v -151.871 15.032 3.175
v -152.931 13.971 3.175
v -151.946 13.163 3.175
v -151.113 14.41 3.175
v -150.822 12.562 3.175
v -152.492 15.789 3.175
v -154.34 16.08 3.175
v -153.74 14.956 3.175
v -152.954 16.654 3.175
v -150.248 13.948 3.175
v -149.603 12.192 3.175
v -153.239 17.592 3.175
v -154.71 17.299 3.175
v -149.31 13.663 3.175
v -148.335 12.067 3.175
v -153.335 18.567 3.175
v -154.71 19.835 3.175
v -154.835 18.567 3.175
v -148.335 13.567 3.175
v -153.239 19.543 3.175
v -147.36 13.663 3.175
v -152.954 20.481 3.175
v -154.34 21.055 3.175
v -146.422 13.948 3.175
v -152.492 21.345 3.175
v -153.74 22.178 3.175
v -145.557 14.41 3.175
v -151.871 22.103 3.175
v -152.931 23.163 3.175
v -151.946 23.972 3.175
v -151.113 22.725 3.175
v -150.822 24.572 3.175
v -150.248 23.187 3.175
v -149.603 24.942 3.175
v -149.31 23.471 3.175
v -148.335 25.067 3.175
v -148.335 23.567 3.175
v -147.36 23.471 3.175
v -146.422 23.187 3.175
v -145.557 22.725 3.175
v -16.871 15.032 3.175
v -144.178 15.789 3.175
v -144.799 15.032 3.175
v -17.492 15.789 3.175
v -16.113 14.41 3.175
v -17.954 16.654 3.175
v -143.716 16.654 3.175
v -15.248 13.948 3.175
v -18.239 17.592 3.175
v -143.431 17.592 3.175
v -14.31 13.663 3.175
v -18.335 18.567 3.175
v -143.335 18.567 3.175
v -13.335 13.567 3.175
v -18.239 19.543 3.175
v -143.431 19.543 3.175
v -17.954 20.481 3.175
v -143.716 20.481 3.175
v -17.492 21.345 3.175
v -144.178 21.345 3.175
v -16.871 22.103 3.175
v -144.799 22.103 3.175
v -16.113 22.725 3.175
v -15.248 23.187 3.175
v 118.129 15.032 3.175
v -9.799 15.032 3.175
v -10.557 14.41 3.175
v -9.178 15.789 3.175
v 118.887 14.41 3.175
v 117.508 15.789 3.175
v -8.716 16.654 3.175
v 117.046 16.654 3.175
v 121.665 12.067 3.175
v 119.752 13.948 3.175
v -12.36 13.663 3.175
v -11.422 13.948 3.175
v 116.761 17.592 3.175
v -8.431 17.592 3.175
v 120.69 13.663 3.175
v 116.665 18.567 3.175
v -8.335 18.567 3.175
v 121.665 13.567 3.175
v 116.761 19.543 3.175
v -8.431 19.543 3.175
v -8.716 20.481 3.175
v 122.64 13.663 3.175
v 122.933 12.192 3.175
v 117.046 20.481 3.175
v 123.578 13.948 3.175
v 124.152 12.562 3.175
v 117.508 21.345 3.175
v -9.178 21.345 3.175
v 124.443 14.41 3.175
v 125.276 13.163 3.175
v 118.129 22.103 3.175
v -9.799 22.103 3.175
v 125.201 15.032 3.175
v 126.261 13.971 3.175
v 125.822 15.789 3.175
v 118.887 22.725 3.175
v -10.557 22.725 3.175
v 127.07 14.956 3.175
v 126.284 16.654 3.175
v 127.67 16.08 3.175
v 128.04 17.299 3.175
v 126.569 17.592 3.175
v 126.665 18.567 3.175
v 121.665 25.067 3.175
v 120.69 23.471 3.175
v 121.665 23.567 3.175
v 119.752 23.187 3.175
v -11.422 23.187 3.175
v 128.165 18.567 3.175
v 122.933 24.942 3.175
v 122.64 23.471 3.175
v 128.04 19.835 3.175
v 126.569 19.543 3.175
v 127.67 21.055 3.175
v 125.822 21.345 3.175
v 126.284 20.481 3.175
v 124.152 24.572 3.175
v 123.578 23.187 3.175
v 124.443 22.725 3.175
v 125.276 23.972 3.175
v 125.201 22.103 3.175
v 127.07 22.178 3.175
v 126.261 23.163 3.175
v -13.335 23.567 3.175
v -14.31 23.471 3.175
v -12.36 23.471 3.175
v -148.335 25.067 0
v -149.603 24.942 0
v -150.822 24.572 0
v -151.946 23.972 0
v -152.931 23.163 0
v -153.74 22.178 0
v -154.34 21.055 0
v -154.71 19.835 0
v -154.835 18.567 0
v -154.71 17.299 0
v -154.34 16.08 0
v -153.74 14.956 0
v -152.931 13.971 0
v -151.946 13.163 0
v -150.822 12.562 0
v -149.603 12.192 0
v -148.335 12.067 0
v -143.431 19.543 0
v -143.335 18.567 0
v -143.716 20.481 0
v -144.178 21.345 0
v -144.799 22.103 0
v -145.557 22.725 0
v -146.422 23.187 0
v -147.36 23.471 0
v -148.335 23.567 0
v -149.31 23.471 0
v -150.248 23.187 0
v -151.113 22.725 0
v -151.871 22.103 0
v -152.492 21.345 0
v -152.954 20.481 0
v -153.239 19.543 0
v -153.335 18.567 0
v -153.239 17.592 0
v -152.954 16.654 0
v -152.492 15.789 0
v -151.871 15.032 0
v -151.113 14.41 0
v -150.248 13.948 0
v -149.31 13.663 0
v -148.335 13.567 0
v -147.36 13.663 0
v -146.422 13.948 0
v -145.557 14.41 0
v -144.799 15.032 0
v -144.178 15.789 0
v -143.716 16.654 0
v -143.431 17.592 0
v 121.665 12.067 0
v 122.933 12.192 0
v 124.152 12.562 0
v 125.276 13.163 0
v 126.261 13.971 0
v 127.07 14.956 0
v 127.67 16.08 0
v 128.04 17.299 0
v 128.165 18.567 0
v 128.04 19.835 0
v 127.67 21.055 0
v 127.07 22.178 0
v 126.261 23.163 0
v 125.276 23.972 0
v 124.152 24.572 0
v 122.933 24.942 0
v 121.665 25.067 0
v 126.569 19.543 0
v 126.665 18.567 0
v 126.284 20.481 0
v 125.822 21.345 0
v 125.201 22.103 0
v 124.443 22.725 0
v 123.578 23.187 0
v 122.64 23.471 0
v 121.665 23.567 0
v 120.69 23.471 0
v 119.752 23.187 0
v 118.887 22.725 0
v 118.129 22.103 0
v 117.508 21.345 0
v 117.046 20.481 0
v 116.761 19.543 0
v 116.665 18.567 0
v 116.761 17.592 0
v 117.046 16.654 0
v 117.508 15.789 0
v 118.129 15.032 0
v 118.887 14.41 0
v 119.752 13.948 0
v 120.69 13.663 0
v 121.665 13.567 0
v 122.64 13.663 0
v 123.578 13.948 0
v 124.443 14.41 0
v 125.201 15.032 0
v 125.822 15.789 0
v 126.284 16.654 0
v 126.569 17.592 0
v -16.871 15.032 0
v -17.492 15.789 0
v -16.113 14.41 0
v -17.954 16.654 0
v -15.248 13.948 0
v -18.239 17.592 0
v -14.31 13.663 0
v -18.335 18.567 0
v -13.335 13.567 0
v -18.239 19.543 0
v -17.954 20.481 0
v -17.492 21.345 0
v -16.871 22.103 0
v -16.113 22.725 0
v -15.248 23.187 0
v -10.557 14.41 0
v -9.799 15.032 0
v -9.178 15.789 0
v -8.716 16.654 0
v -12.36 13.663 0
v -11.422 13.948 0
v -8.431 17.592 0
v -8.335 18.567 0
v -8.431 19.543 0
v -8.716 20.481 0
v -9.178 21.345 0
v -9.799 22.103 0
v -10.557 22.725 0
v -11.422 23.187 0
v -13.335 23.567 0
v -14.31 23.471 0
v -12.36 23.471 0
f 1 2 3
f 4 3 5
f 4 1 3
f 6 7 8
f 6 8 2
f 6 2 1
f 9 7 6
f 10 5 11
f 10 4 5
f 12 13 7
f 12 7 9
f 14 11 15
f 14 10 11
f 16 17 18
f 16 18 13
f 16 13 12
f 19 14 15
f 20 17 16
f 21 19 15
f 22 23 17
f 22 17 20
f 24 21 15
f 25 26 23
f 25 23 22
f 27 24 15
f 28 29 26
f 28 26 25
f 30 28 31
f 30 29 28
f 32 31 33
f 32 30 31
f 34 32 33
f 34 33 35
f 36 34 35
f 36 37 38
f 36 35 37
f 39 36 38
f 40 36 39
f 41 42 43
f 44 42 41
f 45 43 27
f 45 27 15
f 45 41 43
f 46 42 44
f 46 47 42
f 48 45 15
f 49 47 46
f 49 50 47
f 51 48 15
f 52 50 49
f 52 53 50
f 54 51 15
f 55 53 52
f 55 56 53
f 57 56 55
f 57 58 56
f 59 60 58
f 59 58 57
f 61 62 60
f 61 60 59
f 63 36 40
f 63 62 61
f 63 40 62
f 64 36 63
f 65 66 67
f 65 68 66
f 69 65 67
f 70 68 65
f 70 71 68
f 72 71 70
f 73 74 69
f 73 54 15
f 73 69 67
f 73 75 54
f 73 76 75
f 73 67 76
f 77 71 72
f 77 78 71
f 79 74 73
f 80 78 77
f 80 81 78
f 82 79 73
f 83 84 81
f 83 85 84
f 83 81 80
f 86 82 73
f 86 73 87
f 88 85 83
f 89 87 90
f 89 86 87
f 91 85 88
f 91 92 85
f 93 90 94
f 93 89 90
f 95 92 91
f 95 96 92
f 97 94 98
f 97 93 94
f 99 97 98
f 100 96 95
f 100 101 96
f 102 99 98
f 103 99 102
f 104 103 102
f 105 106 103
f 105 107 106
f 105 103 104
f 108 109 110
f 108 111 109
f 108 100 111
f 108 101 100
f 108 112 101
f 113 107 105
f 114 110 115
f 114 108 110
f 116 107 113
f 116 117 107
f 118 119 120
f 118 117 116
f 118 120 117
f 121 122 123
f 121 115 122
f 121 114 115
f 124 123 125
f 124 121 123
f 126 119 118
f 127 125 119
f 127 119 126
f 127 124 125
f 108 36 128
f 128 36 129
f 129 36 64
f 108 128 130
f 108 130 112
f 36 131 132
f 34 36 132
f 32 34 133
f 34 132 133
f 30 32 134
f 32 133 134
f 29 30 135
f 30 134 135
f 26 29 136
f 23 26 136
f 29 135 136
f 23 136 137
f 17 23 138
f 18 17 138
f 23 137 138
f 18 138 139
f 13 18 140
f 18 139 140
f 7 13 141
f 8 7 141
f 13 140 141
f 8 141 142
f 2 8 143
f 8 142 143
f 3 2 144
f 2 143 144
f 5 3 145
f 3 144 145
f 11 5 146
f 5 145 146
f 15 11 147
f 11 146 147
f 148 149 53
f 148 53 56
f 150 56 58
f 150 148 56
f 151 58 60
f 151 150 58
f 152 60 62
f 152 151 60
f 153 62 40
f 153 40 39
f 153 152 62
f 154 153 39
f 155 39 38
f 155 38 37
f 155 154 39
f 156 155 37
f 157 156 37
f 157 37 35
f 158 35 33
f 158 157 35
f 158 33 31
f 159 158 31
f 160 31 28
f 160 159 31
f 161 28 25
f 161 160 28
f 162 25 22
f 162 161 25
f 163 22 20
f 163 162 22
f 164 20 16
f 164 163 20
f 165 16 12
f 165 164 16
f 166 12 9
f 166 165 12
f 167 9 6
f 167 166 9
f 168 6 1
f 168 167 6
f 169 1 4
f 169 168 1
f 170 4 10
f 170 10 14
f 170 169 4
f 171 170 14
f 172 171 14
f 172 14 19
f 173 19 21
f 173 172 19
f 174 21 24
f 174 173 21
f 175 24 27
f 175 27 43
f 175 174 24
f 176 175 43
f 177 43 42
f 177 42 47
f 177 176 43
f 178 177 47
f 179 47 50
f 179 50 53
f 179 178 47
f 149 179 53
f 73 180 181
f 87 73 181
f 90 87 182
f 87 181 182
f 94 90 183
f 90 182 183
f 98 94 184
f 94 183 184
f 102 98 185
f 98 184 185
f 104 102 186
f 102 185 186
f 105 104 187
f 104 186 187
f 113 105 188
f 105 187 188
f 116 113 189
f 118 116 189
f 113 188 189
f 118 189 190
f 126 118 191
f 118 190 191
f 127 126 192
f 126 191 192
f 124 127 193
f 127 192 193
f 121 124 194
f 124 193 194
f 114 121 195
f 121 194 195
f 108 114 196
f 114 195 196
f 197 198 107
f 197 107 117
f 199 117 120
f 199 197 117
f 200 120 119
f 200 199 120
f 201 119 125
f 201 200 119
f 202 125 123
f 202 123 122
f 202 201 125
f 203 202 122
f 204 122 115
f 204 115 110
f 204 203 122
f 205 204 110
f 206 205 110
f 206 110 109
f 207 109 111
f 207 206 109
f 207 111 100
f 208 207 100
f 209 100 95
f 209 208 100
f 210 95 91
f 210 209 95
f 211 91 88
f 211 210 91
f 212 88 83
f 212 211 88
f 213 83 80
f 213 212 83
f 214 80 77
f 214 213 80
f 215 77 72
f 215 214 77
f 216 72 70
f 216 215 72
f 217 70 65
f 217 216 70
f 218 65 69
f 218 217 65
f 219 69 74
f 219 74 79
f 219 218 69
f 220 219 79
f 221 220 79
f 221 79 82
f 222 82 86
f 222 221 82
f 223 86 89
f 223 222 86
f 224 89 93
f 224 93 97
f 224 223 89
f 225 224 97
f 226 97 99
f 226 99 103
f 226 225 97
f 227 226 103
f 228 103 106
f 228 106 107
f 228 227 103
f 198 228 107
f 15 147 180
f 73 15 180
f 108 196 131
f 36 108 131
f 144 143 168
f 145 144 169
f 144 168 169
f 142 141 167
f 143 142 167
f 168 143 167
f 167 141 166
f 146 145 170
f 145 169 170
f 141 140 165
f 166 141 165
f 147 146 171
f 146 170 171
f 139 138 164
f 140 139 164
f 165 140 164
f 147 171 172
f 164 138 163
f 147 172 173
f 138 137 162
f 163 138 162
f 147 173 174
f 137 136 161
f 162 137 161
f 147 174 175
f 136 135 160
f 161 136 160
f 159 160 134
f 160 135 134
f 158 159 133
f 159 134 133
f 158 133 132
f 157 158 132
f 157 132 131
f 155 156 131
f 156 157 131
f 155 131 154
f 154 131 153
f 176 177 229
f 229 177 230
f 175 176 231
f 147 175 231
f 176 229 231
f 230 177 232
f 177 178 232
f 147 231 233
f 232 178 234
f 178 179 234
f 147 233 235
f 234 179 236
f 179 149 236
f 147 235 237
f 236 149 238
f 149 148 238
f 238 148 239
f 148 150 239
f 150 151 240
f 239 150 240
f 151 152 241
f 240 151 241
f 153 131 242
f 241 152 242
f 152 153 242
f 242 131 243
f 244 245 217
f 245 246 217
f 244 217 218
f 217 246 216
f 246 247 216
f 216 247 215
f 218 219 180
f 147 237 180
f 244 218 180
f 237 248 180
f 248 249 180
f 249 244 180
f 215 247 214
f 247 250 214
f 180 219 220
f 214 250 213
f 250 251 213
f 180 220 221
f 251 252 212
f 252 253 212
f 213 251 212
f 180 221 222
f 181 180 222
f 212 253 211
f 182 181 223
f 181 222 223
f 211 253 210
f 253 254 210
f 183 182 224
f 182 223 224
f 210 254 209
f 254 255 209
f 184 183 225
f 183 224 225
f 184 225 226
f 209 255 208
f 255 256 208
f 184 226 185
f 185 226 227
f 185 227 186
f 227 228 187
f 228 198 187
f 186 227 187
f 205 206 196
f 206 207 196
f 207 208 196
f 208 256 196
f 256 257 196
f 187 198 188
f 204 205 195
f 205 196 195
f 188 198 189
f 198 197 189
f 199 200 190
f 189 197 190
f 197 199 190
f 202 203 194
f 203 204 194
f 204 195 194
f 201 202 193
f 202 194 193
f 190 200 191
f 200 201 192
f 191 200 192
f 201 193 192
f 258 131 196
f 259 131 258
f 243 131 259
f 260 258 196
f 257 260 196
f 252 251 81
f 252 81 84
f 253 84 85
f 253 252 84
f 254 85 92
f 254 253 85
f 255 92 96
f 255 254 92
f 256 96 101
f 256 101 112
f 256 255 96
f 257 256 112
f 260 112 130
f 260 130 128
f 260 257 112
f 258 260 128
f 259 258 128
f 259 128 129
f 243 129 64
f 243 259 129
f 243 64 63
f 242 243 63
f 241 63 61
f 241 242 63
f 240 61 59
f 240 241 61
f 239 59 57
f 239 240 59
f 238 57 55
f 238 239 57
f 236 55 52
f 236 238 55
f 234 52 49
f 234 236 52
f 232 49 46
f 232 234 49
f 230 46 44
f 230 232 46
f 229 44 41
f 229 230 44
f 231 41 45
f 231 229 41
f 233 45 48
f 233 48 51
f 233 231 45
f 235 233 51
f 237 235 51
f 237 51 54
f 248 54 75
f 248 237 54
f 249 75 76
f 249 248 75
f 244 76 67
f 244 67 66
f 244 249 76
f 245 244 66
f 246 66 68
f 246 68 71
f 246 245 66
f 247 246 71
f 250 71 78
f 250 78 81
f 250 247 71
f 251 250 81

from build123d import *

# Parameters (mm, degrees)
F0_R     = 5
F1_DEPTH = 3.175


with BuildPart() as f1:
    # F0 (on Top) → F1 (new body)
    with BuildSketch(Plane.XY):
        with BuildLine():
            Line((-80.835, 25.067168), (-148.335, 25.067168))
            ThreePointArc((-148.335, 25.067168), (-154.835, 18.567168), (-148.335, 12.067168))
            Line((-148.335, 12.067168), (-80.835, 12.067168))
            Line((-80.835, 12.067168), (-13.335, 12.067168))
            Line((-13.335, 12.067168), (54.165, 12.067168))
            Line((54.165, 12.067168), (121.665, 12.067168))
            ThreePointArc((121.665, 12.067168), (128.165, 18.567168), (121.665, 25.067168))
            Line((121.665, 25.067168), (54.165, 25.067168))
            Line((54.165, 25.067168), (-13.335, 25.067168))
            Line((-13.335, 25.067168), (-80.835, 25.067168))
        make_face()
        with Locations((-148.335, 18.567168)):
            Circle(F0_R, mode=Mode.SUBTRACT)
        with Locations((-13.335, 18.567168)):
            Circle(F0_R, mode=Mode.SUBTRACT)
        with Locations((121.665, 18.567168)):
            Circle(F0_R, mode=Mode.SUBTRACT)
    extrude(amount=F1_DEPTH)


solid = f1.part
